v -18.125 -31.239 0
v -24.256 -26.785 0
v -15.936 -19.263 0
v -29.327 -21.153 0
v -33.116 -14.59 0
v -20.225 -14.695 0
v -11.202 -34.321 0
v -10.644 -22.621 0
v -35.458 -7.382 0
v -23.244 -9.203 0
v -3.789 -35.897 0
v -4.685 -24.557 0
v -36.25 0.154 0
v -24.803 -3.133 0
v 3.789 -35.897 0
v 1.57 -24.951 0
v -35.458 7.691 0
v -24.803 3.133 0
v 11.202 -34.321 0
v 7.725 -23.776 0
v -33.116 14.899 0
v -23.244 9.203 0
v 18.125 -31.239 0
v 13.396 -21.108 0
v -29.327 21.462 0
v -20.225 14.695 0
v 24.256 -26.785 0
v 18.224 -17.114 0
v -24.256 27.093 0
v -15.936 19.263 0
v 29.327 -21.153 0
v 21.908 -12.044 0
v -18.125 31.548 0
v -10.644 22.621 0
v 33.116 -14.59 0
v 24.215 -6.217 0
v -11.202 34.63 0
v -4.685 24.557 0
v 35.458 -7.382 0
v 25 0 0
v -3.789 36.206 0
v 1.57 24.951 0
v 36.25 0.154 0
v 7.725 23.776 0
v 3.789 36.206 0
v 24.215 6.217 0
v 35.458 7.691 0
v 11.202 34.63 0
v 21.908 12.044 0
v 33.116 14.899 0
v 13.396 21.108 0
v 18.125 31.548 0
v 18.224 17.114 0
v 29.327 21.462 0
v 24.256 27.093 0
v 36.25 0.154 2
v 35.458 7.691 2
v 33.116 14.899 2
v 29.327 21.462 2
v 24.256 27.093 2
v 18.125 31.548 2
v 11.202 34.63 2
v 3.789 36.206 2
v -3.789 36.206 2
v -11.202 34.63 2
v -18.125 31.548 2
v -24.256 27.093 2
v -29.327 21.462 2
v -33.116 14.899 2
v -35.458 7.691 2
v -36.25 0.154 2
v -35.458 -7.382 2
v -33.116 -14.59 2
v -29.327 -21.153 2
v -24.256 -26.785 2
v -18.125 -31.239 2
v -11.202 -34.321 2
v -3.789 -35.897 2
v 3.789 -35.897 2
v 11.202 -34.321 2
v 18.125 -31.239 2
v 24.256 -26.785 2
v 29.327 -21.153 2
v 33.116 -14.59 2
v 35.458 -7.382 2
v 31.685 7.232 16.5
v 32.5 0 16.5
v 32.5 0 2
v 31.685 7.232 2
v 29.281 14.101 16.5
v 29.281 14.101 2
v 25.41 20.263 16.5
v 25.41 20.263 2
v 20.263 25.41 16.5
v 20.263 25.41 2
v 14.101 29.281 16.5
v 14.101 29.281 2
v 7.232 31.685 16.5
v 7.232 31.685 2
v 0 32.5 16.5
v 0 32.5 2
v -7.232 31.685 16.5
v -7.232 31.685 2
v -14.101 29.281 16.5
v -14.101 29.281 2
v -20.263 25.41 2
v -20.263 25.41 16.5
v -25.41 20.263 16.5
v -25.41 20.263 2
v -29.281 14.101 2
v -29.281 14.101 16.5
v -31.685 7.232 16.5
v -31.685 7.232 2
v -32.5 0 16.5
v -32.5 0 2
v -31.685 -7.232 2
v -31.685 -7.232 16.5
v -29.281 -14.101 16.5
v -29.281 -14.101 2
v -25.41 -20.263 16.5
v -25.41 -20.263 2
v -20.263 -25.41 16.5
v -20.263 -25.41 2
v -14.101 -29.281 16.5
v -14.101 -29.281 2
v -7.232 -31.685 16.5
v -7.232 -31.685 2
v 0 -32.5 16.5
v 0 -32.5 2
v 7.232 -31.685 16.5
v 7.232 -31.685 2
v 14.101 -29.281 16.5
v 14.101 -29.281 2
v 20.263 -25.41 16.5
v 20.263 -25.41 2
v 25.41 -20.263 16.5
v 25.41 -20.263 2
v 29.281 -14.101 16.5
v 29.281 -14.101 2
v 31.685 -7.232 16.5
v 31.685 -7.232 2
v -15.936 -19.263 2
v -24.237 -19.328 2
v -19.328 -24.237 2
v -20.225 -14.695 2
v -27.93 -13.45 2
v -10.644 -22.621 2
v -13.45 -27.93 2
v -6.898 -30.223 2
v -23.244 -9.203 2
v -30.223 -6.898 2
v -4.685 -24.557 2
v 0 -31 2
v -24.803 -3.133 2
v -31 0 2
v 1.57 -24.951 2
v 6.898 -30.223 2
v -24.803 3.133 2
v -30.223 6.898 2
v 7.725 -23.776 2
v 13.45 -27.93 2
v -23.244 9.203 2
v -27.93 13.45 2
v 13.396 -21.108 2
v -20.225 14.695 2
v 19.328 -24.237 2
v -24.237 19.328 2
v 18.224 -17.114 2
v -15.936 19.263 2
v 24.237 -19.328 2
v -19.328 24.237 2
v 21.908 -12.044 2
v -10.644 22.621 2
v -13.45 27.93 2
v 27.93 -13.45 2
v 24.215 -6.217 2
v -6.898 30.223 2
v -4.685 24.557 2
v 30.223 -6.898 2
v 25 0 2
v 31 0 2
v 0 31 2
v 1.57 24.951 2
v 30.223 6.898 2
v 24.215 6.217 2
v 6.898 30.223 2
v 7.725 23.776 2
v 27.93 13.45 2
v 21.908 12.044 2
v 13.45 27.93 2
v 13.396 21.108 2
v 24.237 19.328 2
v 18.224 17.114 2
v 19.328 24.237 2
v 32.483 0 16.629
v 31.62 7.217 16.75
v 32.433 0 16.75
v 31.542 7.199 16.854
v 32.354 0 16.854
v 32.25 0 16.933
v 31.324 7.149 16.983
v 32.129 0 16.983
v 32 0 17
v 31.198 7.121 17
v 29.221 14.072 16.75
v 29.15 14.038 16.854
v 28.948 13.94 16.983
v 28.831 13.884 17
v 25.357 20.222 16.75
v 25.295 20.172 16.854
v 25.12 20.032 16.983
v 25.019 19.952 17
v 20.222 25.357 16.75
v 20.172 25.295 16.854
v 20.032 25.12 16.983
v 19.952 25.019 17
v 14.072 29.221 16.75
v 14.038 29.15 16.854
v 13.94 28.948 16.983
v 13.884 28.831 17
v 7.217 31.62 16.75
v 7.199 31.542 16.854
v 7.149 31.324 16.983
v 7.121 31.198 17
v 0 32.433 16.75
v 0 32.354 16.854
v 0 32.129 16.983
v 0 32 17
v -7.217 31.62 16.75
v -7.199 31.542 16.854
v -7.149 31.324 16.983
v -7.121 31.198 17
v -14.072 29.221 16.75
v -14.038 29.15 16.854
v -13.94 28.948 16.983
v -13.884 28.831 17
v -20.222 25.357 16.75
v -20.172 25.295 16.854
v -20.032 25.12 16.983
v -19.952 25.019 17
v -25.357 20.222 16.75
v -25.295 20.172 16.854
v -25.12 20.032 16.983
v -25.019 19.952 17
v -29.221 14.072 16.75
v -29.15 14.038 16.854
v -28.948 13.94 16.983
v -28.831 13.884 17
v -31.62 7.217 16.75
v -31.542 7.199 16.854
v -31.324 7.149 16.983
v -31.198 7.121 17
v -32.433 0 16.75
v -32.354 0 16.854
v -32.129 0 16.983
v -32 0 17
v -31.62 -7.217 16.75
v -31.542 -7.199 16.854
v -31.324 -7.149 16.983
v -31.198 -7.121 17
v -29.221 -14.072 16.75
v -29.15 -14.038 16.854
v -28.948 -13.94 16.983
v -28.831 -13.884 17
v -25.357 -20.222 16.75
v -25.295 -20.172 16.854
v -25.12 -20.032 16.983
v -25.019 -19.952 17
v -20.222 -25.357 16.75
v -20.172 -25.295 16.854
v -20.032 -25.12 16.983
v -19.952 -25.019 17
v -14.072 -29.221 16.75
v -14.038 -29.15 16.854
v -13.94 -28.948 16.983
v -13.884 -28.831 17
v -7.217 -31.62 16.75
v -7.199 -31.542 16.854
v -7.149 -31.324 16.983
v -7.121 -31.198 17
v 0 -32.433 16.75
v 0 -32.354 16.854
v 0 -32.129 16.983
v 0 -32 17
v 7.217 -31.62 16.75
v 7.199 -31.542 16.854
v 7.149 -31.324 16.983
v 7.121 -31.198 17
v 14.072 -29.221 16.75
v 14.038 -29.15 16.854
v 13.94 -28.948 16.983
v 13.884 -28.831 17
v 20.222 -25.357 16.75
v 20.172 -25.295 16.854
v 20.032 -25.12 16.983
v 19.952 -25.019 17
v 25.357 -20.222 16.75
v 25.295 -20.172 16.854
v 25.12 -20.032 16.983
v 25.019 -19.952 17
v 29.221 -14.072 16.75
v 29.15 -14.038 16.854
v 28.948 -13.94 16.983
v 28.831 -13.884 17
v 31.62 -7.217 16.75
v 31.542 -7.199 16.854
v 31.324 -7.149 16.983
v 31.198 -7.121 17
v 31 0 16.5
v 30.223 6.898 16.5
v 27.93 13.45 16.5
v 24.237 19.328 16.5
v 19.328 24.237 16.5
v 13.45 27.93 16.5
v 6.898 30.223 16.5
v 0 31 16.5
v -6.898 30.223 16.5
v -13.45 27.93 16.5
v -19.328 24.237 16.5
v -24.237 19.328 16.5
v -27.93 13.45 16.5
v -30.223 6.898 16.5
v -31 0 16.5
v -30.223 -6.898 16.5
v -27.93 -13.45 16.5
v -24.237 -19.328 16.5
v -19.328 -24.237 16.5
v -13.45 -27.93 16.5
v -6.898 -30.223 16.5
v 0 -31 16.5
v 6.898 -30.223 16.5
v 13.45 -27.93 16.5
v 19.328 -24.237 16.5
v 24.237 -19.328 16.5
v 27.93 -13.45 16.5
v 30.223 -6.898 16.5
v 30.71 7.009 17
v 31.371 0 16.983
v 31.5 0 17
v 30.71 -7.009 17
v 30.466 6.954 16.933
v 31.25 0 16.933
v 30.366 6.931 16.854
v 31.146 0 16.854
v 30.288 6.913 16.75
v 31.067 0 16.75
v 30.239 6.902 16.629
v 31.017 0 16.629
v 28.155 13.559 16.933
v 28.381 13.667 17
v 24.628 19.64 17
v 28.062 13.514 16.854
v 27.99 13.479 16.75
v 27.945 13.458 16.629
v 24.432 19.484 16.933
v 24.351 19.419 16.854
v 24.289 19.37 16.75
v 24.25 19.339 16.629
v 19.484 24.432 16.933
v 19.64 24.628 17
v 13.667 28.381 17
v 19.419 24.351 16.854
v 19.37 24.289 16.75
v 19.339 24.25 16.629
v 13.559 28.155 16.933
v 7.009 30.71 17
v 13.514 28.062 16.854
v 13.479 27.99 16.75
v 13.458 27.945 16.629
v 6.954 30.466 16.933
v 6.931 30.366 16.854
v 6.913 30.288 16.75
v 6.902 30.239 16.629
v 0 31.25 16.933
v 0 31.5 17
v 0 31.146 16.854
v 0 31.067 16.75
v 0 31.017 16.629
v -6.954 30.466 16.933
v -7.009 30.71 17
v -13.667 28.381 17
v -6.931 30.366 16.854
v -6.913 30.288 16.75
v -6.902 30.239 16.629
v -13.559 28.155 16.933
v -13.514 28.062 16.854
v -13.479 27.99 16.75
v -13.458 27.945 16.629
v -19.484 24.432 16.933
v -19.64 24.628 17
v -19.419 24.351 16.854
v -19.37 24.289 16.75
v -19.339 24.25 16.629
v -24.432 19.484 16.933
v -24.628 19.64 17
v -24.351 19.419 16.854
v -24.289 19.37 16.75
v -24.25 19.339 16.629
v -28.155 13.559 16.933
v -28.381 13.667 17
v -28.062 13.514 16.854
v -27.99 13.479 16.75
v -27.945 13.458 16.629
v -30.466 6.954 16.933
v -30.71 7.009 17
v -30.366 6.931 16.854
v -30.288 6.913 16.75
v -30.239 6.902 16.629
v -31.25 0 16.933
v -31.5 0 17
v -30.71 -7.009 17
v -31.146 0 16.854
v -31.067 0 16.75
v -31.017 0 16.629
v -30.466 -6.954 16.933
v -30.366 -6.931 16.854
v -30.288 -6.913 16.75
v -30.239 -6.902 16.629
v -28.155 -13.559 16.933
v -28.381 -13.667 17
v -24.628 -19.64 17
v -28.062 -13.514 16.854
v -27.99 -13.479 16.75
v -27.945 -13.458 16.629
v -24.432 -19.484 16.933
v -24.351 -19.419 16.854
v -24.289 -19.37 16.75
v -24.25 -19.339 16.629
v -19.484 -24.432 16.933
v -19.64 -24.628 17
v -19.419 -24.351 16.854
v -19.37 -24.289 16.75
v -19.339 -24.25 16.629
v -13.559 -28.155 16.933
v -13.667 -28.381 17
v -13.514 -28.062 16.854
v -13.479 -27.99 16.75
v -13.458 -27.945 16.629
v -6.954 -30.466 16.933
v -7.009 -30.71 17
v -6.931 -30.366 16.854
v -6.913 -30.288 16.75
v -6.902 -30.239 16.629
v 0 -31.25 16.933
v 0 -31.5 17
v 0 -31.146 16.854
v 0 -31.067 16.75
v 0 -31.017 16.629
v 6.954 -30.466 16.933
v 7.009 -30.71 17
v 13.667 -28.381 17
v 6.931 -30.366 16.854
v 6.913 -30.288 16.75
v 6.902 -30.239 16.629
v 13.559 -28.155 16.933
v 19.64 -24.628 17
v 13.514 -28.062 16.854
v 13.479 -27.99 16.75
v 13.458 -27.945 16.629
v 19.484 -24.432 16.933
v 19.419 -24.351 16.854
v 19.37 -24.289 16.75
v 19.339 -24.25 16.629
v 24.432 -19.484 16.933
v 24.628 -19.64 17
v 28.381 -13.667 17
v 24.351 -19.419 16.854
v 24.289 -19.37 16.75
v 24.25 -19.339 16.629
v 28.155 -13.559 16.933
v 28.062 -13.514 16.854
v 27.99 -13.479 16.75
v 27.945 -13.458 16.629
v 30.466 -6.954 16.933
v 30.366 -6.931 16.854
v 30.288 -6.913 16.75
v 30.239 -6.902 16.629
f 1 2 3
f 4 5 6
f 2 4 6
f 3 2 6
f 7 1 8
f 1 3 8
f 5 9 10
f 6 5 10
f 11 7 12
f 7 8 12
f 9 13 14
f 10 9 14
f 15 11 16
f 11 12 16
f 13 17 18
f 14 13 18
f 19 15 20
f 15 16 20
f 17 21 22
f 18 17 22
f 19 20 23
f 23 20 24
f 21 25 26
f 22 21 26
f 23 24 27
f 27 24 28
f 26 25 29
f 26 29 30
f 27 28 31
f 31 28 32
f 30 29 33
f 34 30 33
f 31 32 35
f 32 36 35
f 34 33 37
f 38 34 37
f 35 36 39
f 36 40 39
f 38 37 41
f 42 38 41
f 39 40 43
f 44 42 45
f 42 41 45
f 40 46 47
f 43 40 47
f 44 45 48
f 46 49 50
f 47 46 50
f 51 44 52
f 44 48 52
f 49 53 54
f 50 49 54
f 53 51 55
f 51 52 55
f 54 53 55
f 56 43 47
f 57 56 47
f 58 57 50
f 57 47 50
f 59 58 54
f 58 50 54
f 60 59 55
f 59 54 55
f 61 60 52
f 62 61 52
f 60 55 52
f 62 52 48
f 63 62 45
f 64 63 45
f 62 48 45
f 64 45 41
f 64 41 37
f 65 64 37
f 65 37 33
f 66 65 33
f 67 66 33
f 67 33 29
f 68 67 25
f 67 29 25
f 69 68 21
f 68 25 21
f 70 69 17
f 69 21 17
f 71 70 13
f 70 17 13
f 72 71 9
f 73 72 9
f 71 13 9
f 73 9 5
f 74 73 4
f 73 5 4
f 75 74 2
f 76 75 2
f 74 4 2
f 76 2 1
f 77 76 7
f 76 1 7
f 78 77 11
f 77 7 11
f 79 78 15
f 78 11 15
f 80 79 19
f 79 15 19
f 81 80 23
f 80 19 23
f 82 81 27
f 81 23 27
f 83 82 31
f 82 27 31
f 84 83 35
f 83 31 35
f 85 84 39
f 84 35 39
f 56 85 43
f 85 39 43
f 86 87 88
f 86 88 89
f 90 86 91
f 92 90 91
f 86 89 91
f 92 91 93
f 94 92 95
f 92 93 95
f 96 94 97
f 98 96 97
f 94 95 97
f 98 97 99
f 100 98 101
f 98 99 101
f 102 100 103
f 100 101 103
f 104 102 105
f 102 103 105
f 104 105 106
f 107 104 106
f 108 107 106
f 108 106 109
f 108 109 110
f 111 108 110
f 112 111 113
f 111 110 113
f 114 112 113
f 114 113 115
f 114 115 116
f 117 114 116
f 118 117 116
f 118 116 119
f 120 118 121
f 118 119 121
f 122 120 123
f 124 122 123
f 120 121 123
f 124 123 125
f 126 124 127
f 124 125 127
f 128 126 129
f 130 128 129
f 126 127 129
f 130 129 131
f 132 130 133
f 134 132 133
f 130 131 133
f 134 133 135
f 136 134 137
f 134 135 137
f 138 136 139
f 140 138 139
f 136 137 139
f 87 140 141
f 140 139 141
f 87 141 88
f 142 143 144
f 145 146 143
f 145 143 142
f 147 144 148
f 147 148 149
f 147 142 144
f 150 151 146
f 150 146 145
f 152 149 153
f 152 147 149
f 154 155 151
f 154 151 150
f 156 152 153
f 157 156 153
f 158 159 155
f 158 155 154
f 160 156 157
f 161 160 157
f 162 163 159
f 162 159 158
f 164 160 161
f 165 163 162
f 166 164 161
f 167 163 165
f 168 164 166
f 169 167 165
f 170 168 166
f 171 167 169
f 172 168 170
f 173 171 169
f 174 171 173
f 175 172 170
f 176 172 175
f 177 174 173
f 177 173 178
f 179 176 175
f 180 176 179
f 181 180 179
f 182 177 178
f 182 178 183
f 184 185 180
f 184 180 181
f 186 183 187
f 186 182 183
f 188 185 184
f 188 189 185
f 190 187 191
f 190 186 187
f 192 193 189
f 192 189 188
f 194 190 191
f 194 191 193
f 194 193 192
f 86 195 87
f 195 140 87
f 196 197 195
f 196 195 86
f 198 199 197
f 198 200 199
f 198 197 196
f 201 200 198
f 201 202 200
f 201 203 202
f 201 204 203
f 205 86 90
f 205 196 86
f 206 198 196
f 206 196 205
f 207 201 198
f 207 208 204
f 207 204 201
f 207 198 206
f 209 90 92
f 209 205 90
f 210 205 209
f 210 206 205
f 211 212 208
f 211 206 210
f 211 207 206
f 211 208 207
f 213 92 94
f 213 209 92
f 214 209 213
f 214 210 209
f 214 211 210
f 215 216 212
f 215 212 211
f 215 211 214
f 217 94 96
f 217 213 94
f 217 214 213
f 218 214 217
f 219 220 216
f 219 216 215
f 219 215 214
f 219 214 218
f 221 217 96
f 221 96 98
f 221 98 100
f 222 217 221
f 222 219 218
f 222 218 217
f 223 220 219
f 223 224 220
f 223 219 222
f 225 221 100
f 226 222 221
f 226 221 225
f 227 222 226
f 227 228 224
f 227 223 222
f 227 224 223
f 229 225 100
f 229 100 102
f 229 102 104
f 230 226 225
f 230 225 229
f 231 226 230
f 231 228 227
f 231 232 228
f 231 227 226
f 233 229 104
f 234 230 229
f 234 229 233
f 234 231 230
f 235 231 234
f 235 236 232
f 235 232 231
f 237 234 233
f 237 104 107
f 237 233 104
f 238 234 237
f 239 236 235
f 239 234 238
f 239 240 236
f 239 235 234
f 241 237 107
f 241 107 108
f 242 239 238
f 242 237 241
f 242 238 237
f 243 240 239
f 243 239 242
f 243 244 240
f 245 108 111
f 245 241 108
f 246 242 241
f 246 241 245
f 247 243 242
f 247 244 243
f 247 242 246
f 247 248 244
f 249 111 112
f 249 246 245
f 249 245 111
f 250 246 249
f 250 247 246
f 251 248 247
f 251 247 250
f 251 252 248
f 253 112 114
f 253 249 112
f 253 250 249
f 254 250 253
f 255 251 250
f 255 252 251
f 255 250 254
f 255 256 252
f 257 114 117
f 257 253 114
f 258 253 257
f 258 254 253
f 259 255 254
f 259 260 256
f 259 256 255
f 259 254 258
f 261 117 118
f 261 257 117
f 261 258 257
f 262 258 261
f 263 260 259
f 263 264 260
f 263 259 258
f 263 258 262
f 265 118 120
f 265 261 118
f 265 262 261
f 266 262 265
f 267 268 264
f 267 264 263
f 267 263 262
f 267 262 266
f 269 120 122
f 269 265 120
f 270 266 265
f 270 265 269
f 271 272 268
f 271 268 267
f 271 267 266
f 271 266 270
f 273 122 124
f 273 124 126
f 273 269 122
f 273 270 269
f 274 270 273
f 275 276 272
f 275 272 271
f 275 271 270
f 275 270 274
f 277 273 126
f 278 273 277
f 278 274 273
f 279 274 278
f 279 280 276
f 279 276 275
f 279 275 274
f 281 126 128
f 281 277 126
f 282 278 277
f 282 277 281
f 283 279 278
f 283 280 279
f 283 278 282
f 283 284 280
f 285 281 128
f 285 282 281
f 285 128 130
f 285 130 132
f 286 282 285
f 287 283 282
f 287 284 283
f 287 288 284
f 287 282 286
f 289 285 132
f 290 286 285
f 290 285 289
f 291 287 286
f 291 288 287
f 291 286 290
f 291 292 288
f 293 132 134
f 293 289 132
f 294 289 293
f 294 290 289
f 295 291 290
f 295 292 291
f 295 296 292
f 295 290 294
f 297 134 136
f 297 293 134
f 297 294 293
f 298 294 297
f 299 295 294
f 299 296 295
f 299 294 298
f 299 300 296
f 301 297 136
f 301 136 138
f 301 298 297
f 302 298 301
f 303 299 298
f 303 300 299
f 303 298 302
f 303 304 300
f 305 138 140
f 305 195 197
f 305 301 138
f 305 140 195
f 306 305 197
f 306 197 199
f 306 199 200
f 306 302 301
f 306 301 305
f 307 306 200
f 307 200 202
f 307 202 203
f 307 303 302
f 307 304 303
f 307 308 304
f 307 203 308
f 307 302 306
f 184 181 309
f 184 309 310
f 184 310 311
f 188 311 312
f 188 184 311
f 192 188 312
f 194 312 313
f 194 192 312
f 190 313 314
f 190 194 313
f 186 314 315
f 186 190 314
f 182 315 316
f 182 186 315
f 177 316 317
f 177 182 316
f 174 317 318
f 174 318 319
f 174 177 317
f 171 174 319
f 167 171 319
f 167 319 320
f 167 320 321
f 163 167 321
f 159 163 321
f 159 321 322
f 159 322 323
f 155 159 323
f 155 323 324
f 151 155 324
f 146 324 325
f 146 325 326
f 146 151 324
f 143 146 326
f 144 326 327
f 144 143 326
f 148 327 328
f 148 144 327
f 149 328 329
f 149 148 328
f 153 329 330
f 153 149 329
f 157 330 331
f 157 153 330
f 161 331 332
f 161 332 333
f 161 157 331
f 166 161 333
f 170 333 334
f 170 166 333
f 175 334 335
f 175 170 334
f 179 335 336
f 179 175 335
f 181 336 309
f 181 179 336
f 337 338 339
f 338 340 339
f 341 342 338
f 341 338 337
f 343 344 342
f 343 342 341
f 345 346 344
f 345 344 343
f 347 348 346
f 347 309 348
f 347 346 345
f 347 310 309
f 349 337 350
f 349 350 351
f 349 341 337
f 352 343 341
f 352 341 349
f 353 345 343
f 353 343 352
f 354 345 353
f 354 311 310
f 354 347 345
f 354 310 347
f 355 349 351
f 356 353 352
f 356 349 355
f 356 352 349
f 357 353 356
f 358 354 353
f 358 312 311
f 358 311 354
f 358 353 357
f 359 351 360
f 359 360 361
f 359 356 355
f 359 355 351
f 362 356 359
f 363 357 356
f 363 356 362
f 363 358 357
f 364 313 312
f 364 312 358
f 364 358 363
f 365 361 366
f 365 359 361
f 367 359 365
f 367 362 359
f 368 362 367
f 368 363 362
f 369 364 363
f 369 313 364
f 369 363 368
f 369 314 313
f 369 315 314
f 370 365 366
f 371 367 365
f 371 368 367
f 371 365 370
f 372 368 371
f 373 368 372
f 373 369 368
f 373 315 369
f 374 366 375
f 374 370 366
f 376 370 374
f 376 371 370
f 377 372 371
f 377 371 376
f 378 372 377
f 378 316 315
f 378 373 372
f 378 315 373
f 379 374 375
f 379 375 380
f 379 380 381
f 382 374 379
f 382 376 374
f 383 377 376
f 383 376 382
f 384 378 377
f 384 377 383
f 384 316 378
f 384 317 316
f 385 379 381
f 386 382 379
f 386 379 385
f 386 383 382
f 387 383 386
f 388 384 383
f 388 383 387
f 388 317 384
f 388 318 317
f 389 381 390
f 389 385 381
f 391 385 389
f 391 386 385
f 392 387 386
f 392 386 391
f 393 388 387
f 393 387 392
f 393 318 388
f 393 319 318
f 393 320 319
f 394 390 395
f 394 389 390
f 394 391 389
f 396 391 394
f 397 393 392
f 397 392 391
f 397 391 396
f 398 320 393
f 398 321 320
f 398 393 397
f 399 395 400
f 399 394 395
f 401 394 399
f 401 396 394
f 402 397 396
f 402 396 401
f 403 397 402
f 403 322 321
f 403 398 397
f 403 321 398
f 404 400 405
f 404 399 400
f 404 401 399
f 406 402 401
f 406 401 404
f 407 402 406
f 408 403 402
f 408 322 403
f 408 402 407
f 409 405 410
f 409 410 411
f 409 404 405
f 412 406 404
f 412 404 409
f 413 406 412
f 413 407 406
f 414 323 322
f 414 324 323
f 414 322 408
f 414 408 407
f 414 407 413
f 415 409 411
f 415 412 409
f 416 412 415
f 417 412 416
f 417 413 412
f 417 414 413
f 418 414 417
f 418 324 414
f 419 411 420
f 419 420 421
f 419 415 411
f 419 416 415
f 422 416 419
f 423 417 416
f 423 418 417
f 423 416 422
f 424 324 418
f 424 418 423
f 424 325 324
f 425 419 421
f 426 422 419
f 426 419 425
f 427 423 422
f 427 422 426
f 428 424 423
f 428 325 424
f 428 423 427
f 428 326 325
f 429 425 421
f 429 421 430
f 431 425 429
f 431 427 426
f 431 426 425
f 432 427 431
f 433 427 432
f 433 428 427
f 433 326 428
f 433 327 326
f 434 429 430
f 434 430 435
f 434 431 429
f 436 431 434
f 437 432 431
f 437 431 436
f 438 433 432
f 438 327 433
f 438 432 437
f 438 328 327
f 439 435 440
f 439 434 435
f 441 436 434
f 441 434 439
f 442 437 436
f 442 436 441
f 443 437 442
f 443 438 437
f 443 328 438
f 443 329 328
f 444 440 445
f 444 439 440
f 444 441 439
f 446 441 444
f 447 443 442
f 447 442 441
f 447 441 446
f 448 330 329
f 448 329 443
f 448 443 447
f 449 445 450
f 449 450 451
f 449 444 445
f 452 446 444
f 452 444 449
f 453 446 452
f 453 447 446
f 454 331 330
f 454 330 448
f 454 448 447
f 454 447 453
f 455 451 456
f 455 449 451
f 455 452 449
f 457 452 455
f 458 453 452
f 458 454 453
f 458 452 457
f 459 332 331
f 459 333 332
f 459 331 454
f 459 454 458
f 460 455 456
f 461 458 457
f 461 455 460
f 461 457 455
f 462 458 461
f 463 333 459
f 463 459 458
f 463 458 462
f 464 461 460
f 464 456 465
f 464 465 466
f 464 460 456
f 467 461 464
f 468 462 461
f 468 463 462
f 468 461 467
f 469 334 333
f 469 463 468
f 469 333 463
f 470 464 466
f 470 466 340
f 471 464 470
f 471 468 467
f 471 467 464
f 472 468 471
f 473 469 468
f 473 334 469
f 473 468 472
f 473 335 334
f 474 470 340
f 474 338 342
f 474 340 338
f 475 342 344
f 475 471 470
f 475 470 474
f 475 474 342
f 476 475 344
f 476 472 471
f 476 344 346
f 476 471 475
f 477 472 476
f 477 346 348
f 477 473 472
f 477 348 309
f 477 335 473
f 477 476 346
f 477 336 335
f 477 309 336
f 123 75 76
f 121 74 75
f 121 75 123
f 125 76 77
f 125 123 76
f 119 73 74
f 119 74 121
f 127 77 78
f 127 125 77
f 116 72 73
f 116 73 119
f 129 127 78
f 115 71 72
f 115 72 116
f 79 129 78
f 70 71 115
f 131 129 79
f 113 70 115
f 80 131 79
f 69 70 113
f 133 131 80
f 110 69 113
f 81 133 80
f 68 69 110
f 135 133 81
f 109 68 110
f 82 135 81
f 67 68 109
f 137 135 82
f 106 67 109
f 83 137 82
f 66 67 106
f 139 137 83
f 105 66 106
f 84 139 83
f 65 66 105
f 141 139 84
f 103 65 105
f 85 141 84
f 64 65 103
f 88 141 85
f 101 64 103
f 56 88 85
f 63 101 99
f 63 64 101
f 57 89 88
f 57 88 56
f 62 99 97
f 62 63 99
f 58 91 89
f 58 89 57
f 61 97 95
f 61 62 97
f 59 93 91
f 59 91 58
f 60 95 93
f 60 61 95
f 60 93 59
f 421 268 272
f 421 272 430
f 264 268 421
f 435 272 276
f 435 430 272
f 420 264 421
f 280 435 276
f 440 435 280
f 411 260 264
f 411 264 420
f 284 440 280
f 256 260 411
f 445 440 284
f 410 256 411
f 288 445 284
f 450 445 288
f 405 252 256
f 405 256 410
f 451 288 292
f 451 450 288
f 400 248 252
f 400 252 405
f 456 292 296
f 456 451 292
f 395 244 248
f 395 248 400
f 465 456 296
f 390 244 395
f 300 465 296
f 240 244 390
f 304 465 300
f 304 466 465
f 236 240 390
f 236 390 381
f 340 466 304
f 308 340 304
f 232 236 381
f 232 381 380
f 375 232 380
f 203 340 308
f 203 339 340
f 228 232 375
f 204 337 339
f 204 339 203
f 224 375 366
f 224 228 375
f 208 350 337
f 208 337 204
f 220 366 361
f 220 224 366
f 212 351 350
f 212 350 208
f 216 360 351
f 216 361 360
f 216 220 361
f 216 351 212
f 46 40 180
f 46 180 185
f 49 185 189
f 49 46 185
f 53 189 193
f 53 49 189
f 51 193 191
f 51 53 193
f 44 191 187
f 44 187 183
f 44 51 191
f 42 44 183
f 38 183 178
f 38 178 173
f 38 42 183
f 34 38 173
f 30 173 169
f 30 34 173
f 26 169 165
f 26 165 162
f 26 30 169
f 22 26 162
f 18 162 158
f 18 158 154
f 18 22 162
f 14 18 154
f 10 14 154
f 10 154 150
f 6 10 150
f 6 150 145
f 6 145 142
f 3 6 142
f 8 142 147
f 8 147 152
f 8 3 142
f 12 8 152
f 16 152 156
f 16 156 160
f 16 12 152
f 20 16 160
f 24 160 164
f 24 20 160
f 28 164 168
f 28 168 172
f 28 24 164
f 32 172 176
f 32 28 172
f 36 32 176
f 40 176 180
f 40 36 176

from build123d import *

# Parameters (mm, degrees)
F0_R     = 36.25
F0_R_2   = 25
F1_DEPTH = 2
F2_R     = 30
F2_R_2   = 32.5
F2_R_3   = 31
F3_DEPTH = 15
F4_R     = 0.5


with BuildPart() as f1:
    # F0 (on Top) → F1 (new body)
    with BuildSketch(Plane.XY):
        with Locations((0, 0.15434)):
            Circle(F0_R)
        Circle(F0_R_2, mode=Mode.SUBTRACT)
    extrude(amount=F1_DEPTH)

    # F2 (on face) → F3 (join)
    with BuildSketch(Plane.XY.offset(2)):
        Circle(F2_R)
        Circle(F2_R_2)
        Circle(F2_R_3, mode=Mode.SUBTRACT)
    extrude(amount=F3_DEPTH)

    # F4
    f4_edges = [f1.edges().sort_by_distance(p)[0] for p in [
        (-32.5, 0, 17),
        (-31, 0, 17),
    ]]
    fillet(f4_edges, radius=F4_R)


solid = f1.part
